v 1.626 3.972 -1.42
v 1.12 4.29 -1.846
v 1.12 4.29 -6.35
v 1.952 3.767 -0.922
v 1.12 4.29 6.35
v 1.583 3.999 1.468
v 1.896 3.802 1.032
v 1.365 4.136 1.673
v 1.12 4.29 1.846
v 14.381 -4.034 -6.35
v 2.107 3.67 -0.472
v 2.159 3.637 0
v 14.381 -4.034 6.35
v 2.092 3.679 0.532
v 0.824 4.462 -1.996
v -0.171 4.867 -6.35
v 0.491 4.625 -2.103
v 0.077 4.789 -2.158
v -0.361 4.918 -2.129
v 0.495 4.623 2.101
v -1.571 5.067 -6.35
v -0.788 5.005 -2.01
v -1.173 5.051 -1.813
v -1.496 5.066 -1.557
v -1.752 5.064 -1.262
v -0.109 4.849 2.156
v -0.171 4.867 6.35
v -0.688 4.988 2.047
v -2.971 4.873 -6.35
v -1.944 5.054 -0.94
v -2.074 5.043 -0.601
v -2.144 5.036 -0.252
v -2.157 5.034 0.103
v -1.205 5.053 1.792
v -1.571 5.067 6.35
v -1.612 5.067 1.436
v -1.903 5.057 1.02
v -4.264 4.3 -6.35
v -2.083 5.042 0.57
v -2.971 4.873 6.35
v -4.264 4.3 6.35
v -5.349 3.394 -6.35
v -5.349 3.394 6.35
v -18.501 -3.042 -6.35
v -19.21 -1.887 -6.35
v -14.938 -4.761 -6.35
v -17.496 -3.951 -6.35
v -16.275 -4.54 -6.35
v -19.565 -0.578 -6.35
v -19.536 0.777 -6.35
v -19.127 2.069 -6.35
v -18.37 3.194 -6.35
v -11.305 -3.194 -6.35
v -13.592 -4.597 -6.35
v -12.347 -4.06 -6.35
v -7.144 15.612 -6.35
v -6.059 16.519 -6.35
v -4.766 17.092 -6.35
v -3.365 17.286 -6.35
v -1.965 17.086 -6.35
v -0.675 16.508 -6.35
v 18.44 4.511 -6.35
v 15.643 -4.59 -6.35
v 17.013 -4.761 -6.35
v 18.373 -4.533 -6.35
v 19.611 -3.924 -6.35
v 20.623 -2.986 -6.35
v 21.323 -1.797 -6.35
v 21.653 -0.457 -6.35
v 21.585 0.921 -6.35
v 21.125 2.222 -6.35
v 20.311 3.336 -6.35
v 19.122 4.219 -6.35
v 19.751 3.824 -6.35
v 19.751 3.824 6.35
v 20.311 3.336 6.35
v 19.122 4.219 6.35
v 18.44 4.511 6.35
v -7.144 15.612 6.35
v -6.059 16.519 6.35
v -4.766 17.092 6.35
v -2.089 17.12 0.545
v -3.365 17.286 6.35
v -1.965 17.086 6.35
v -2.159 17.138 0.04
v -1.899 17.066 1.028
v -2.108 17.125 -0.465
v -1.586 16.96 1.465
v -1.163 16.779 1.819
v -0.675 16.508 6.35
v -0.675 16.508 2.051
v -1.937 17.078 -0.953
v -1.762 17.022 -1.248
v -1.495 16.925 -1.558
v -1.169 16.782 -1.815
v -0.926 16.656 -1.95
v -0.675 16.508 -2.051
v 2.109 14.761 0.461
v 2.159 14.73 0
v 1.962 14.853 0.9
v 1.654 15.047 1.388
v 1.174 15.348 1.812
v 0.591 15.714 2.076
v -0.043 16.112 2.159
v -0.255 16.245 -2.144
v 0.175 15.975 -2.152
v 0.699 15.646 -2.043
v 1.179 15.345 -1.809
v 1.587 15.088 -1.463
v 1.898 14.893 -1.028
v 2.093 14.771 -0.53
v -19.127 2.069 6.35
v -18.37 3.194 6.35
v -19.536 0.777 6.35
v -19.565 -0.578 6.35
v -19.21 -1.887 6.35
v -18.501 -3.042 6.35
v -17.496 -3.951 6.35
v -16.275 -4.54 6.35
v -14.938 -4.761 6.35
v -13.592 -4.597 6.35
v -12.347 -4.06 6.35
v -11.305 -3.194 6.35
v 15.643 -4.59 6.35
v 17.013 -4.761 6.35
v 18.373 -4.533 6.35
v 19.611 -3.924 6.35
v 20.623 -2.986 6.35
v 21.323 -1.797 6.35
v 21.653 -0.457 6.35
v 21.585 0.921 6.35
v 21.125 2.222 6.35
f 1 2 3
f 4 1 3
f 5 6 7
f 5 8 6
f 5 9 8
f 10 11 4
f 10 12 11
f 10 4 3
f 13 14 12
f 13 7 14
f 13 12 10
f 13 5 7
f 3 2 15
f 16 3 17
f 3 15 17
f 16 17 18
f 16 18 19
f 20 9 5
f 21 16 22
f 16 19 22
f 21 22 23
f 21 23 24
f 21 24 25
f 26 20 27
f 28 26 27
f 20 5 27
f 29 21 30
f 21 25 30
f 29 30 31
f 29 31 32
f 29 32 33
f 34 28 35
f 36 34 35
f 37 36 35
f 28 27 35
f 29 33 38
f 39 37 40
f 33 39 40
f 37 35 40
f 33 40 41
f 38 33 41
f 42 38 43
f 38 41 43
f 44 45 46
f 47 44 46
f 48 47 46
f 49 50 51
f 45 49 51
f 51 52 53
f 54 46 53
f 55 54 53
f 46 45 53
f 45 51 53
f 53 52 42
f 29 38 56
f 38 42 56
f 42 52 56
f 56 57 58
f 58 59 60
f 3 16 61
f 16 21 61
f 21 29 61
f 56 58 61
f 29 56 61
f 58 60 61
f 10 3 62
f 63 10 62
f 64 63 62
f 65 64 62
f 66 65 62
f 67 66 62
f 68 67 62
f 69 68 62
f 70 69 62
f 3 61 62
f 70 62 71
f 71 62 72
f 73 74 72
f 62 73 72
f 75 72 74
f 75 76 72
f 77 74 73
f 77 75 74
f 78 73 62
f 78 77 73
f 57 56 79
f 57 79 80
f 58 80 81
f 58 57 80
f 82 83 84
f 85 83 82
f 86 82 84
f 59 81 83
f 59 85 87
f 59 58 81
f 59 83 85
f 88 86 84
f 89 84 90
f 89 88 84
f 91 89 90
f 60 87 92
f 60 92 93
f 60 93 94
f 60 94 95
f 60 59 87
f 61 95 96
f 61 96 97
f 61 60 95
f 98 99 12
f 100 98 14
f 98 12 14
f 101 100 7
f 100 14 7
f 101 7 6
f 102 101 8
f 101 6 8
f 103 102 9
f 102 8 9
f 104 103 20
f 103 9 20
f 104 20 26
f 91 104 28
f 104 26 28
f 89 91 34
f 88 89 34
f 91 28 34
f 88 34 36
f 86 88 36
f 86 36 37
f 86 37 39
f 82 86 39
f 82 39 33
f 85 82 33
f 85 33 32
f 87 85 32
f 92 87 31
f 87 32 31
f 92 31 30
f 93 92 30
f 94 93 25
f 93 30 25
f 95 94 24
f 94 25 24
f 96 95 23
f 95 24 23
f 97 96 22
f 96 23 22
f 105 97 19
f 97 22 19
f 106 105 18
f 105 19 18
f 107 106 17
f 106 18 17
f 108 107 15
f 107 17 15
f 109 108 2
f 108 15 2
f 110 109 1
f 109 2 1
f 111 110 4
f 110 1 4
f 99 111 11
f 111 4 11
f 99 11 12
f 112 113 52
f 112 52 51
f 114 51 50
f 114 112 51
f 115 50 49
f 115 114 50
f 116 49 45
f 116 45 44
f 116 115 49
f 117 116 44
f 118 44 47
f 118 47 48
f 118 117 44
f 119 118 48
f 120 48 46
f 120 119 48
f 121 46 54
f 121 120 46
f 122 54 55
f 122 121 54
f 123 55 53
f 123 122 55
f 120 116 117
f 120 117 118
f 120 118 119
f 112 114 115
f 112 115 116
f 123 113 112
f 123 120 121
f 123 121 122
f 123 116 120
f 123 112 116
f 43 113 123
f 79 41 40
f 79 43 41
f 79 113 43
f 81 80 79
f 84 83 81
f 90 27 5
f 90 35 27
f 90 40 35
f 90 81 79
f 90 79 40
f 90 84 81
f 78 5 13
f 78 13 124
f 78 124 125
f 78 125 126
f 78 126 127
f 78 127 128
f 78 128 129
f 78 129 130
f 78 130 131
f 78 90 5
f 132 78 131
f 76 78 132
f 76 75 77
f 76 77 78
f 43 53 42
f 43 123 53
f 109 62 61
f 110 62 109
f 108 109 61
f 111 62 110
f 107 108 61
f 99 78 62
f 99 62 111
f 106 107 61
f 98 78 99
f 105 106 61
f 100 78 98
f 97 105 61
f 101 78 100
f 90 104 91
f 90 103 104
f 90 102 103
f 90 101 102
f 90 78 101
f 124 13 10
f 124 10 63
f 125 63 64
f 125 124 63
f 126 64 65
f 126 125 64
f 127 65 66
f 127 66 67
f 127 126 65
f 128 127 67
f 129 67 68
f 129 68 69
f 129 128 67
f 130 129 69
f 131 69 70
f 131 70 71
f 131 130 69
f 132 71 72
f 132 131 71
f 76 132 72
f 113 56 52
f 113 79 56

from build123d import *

# Parameters (mm, degrees)
F1_DEPTH = 6.35
F2_R     = 5.08
F3_R     = 2.159
F4_DEPTH = 17.286523


with BuildPart() as f1:
    # F0 (on Top) → F1 (new body, symmetric)
    with BuildSketch(Plane.XY):
        with BuildLine():
            Line((-4.284978, 18.774289), (-18.370262, 3.193811))
            ThreePointArc((-18.370262, 3.193811), (-18.031229, -3.532843), (-11.304576, -3.193811))
            Line((-11.304576, -3.193811), (-2.490694, 6.55569))
            Line((-2.490694, 6.55569), (14.380764, -4.033771))
            ThreePointArc((14.380764, -4.033771), (20.623101, -2.98554), (20.310992, 3.336497))
            Line((20.310992, 3.336497), (18.439706, 4.511019))
            Line((18.439706, 4.511019), (-4.284978, 18.774289))
        make_face()
        with BuildLine():
            ThreePointArc((20.310992, 3.336497), (19.444399, 4.033771), (18.439706, 4.511019))
            Line((18.439706, 4.511019), (20.310992, 3.336497))
        make_face()
    extrude(amount=F1_DEPTH, both=True)

    # F2
    f2_edges = [f1.edges().sort_by_distance(p)[0] for p in [
        (-4.284978, 18.774289, 0),
        (-2.490694, 6.55569, 0),
    ]]
    fillet(f2_edges, radius=F2_R)

    # F3 (on Front) → F4 (cut, through all)
    with BuildSketch(Plane.XZ):
        Circle(F3_R)
    extrude(amount=-F4_DEPTH, mode=Mode.SUBTRACT)


solid = f1.part
